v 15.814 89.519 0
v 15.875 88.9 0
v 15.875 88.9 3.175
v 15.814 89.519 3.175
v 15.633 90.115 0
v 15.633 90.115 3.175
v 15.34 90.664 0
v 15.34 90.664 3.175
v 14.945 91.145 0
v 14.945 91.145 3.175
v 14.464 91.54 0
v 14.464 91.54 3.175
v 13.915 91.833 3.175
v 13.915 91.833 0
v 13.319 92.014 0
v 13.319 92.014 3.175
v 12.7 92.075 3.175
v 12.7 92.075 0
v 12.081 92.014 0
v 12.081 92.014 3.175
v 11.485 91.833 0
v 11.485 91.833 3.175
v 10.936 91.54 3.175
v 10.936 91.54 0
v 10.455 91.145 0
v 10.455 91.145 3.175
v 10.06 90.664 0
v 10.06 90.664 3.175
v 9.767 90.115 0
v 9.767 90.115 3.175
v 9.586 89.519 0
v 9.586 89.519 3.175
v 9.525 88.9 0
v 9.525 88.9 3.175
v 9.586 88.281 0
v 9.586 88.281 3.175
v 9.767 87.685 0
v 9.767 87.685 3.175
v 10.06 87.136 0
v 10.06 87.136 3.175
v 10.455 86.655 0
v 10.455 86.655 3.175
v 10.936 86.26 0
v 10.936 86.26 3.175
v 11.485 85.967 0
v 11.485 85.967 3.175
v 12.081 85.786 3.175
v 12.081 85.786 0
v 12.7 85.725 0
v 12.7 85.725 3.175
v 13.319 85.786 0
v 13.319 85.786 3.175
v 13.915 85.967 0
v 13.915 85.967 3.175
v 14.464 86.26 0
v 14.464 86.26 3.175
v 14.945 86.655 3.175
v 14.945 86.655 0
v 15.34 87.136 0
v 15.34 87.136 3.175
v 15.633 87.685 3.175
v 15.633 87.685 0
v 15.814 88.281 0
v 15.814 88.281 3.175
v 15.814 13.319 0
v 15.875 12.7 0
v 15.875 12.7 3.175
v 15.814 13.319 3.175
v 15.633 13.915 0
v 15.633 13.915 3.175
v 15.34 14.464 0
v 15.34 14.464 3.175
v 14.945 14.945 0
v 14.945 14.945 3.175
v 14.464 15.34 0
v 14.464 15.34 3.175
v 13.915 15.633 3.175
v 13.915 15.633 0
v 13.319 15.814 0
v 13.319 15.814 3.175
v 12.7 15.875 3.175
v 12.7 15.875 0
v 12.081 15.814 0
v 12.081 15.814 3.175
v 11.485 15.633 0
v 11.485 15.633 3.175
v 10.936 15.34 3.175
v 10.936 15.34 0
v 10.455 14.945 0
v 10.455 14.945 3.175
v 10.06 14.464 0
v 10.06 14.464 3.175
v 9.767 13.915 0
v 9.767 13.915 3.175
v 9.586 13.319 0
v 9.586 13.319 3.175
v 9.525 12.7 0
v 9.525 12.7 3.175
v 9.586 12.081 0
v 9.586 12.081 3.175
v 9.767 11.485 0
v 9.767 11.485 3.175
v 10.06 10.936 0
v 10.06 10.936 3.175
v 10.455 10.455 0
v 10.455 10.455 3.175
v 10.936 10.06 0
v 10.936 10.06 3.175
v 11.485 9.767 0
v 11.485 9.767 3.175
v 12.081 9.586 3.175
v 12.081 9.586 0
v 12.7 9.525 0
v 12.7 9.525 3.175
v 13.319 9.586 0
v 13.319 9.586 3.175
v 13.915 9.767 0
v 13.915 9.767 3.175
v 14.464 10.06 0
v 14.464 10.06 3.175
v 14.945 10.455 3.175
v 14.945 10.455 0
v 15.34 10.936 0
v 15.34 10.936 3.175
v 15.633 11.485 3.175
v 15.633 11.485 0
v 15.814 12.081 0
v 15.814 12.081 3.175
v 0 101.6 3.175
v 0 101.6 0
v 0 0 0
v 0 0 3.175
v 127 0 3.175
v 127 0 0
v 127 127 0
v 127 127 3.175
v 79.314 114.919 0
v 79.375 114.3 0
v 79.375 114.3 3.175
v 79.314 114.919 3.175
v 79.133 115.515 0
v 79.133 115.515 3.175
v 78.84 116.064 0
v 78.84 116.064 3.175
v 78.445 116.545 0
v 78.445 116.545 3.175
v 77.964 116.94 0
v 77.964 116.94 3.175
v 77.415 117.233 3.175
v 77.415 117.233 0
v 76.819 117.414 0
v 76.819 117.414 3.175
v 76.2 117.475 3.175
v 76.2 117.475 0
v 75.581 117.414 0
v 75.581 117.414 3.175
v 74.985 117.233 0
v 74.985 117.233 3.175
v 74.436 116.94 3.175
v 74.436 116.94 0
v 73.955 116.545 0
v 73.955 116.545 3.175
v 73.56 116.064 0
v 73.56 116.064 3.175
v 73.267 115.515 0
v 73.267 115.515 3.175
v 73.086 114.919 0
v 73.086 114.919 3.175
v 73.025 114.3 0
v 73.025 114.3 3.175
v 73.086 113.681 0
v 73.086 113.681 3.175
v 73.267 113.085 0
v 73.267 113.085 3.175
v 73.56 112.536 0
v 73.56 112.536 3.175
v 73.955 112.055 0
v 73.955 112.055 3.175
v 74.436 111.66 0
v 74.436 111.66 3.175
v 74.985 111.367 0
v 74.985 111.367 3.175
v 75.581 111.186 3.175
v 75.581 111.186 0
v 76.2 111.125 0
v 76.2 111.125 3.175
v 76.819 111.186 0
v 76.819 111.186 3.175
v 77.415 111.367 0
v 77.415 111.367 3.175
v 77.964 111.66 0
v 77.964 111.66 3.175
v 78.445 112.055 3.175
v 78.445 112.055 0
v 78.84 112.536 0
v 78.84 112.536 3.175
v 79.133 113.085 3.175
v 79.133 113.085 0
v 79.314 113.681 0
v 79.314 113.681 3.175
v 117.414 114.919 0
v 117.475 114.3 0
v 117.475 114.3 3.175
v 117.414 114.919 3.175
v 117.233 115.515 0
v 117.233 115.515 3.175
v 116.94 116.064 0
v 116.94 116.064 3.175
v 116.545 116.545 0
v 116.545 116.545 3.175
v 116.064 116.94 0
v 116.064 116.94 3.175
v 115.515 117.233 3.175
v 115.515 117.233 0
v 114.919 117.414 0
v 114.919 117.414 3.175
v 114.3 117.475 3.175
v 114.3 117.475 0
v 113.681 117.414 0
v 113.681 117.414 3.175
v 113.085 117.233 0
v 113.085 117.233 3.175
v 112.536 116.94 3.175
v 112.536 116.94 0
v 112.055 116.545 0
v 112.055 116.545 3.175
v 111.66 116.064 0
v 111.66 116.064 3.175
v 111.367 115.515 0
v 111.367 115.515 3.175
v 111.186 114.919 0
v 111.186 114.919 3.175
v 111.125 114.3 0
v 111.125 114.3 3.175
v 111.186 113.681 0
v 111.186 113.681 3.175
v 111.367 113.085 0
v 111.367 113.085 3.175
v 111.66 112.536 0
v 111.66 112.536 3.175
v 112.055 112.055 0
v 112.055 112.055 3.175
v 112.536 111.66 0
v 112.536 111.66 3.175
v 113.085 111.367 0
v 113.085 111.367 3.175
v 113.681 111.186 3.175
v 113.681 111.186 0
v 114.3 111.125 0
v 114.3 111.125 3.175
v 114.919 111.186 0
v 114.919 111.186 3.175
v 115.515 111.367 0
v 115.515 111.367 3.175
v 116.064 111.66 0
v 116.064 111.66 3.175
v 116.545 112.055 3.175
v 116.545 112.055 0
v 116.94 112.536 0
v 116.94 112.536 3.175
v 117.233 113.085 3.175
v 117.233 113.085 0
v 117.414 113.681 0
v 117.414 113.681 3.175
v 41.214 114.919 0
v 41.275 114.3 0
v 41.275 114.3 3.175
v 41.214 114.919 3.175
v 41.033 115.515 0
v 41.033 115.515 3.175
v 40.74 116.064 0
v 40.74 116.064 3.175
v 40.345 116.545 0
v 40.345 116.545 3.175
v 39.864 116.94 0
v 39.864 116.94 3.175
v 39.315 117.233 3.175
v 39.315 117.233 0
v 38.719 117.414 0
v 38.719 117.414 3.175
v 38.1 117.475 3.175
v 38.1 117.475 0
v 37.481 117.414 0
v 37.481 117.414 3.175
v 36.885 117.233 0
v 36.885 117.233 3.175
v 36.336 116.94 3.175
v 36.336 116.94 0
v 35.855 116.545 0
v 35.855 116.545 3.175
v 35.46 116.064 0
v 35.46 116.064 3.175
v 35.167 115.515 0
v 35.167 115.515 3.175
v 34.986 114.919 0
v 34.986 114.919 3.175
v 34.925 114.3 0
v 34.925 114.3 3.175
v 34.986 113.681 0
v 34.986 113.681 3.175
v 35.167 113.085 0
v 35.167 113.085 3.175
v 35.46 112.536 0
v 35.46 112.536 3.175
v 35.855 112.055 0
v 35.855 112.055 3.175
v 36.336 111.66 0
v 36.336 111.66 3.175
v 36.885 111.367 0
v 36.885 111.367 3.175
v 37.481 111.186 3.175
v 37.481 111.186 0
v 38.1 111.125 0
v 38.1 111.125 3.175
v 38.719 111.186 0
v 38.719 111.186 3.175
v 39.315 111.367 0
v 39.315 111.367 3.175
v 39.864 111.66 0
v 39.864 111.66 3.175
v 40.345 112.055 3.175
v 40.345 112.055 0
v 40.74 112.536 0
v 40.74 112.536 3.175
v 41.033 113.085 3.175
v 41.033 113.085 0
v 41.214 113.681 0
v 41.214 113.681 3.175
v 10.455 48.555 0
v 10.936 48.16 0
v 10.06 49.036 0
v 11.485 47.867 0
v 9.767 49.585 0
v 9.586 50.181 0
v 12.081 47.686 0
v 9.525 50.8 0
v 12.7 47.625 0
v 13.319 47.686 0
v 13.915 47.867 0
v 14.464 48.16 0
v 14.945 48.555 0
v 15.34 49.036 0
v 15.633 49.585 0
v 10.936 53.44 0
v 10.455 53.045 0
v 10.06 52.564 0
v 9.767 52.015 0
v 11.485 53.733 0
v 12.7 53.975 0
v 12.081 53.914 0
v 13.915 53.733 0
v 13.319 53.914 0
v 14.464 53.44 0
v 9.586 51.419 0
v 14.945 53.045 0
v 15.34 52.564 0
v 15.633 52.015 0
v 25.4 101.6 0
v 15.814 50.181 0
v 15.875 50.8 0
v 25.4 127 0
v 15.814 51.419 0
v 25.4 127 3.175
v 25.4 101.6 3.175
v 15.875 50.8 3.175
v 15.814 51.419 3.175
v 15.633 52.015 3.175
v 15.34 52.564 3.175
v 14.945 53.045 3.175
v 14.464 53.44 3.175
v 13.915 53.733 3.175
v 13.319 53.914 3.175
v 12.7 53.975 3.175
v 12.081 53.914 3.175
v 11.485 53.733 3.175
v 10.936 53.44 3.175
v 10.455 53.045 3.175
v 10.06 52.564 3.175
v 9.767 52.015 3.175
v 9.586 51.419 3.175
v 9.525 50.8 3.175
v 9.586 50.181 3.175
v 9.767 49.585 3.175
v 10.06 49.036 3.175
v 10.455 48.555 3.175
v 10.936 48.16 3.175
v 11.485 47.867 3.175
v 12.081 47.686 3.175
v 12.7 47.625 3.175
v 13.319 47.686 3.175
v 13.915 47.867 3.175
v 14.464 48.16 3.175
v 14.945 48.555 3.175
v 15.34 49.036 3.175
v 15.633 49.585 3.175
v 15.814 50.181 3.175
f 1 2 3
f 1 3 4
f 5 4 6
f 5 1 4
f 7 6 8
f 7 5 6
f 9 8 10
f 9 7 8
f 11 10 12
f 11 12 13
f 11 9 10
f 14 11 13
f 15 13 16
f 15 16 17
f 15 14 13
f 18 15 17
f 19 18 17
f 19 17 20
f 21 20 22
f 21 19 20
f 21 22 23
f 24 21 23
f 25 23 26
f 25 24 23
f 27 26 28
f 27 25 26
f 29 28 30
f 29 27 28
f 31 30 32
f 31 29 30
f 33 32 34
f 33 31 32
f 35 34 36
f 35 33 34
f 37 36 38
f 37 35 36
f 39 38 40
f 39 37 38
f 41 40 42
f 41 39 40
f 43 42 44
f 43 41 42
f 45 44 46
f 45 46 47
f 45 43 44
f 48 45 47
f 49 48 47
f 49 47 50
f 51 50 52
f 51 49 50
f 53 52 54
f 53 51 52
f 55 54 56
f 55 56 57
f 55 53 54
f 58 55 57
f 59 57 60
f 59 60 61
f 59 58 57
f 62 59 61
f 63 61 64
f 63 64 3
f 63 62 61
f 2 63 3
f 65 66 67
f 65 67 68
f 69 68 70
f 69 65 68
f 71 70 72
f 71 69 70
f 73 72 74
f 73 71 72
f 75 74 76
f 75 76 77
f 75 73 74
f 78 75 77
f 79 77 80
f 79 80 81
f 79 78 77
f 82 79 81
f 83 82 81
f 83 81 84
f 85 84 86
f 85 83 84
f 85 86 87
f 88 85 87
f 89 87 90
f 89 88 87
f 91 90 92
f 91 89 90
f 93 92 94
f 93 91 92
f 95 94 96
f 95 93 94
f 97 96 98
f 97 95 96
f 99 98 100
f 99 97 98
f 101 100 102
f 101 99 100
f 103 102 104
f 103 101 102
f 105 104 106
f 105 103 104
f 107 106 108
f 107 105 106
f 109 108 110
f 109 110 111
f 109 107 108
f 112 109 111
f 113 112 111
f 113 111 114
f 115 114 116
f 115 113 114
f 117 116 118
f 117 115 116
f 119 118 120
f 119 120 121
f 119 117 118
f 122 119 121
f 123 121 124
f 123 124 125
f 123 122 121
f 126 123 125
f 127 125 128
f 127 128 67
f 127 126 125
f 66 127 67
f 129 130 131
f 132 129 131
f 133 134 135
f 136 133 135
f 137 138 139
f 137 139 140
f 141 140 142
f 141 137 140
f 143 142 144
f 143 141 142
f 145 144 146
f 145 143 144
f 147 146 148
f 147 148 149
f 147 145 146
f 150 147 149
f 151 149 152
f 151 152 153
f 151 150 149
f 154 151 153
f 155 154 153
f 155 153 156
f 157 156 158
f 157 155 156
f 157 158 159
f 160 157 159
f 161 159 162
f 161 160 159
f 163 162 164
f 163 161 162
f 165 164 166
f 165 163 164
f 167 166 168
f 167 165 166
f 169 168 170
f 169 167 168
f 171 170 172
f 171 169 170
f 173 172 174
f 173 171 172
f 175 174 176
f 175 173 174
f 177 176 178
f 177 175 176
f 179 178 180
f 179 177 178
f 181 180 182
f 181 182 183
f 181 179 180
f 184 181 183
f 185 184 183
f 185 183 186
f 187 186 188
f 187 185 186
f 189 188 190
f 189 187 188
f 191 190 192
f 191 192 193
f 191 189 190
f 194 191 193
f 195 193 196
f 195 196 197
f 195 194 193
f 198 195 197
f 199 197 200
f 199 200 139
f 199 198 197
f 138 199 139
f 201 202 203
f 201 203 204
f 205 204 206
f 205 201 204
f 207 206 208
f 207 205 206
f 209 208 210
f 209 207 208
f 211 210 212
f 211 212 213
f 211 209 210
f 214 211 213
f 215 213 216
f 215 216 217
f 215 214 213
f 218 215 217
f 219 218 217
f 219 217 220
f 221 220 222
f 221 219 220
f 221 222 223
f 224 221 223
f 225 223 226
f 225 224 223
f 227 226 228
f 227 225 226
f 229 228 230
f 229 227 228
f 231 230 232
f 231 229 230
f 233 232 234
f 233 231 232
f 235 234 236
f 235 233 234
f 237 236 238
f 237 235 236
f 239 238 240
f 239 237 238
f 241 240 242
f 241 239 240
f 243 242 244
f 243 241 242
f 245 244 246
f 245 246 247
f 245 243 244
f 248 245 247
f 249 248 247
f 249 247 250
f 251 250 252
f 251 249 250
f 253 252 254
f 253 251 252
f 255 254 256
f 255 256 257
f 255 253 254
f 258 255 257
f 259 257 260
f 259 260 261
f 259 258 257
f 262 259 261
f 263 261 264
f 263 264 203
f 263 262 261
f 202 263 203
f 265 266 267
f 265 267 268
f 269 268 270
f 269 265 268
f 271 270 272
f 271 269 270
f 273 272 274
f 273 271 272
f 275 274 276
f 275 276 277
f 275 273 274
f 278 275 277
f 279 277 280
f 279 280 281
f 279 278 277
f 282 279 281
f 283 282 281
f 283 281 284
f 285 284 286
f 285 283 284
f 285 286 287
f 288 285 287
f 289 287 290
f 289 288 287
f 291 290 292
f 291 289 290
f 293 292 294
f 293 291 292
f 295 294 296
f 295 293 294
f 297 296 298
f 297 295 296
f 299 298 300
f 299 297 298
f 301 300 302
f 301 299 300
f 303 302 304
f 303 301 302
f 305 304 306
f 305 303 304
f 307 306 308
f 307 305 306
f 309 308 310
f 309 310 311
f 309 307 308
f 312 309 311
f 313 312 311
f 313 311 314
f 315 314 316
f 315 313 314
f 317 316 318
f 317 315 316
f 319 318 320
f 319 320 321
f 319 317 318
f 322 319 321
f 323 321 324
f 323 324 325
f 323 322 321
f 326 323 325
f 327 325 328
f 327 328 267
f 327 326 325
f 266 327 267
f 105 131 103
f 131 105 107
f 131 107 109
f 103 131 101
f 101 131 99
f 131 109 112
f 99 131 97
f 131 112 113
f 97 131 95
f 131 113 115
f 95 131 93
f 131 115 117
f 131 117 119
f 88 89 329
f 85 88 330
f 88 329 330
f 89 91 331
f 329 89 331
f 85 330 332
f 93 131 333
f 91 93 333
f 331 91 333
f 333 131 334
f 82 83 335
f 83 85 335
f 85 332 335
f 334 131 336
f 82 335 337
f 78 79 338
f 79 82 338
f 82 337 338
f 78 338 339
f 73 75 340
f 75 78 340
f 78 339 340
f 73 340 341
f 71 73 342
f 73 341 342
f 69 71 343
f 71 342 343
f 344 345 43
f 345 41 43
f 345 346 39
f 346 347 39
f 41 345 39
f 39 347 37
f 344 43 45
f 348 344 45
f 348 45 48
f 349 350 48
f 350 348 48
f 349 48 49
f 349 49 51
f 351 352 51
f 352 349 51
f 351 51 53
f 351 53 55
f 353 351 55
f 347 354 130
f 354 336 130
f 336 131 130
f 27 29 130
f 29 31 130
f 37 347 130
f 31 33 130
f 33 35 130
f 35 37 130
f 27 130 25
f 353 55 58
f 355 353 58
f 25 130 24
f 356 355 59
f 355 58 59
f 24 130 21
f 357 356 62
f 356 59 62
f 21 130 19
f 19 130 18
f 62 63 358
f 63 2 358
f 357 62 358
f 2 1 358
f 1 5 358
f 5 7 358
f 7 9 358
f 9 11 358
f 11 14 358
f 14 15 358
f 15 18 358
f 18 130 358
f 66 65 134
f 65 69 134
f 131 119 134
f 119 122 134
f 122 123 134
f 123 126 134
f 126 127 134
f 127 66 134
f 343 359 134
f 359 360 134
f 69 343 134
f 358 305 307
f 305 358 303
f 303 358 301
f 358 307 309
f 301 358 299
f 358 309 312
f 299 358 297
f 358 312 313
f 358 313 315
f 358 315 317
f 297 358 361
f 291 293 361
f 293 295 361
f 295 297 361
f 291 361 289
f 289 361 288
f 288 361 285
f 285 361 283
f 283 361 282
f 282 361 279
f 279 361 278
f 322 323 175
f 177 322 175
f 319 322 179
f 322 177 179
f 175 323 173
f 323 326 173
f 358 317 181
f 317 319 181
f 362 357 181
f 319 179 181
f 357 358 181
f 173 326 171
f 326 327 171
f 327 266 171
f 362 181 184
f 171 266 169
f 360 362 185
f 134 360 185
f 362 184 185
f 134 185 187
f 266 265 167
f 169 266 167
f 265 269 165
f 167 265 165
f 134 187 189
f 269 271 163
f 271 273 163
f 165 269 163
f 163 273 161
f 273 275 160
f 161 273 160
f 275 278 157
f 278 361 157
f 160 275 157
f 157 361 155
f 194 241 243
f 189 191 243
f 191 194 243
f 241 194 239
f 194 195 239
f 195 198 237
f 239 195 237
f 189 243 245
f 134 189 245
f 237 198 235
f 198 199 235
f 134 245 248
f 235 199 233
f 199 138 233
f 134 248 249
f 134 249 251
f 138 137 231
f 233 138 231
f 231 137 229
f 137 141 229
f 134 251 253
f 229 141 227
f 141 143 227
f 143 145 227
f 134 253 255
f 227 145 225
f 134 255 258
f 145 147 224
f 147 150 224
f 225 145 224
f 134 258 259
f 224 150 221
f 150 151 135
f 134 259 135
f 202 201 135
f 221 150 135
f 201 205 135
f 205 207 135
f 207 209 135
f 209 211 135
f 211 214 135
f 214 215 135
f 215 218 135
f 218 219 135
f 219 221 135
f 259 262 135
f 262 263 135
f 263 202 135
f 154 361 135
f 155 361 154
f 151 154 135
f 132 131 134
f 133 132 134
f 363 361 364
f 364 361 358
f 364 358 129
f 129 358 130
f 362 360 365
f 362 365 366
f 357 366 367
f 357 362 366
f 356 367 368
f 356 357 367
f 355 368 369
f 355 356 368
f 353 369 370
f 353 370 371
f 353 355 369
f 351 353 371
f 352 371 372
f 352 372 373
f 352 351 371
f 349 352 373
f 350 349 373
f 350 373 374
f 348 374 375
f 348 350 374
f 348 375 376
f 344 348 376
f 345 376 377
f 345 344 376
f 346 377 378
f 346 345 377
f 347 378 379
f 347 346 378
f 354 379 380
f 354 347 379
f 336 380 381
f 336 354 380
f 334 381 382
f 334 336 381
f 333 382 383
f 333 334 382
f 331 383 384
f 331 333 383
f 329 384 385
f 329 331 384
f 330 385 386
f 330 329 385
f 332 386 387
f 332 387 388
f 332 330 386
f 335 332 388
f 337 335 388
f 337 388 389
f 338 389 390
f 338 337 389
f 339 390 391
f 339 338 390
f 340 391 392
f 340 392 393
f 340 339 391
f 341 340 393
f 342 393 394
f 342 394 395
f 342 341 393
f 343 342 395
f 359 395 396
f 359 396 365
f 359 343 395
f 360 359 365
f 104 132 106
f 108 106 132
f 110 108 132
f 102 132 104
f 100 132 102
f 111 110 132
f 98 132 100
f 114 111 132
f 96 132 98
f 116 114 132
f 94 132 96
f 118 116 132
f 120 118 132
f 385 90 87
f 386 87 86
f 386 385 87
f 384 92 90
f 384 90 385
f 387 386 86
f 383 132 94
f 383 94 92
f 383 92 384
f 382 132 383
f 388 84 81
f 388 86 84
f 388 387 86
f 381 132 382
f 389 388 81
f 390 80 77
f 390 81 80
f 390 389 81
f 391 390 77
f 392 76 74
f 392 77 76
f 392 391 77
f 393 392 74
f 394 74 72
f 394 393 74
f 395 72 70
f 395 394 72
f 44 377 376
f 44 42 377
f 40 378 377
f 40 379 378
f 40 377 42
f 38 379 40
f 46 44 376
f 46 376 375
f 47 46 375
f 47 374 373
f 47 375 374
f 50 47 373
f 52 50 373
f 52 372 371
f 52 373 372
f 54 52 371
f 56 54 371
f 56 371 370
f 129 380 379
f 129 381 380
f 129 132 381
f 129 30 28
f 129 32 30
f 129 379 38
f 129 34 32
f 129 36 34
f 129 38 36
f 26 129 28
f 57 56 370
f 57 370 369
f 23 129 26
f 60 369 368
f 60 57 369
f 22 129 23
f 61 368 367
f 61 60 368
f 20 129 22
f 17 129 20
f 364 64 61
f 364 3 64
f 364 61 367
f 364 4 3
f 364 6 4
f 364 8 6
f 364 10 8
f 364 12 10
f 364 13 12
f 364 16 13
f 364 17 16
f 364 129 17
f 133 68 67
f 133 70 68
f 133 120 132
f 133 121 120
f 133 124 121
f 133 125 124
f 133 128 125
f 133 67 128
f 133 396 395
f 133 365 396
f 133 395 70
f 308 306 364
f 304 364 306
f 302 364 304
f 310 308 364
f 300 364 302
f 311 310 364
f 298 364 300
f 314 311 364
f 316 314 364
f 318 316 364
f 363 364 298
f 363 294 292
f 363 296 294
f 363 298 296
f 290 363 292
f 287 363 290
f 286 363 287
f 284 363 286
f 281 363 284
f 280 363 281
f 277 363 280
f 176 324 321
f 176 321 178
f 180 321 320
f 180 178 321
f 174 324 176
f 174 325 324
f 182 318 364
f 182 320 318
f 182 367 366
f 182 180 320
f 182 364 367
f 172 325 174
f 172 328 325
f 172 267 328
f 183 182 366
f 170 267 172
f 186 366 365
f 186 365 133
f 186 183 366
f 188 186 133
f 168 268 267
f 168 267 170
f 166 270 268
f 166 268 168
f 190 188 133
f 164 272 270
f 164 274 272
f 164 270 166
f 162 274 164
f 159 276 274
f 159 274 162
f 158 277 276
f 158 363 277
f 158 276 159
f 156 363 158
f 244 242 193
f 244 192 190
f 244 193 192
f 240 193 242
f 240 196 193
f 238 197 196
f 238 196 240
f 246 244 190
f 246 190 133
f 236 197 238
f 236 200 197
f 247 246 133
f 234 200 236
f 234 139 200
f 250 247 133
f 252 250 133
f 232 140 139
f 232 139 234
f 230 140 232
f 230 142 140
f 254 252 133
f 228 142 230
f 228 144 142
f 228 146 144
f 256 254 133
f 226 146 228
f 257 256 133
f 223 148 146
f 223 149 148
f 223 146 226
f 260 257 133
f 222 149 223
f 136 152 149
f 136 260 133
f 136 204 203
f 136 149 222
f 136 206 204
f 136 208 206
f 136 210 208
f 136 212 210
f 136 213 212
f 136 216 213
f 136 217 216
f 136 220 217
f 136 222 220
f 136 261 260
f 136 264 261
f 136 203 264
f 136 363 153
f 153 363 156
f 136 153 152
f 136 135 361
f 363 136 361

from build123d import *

# Parameters (mm, degrees)
SKETCH1_R           = 3.175
BOSS_EXTRUDE1_DEPTH = 3.175


with BuildPart() as part:
    # Sketch1 → Boss-Extrude1 (new body)
    with BuildSketch(Plane.XY):
        Polygon((0, 0), (127, 0), (127, 127), (25.4, 127), (25.4, 101.6), (0, 101.6), align=None)
        with Locations((12.7, 88.9)):
            Circle(SKETCH1_R, mode=Mode.SUBTRACT)
        with Locations((12.7, 50.8)):
            Circle(SKETCH1_R, mode=Mode.SUBTRACT)
        with Locations((12.7, 12.7)):
            Circle(SKETCH1_R, mode=Mode.SUBTRACT)
        with Locations((38.1, 114.3)):
            Circle(SKETCH1_R, mode=Mode.SUBTRACT)
        with Locations((76.2, 114.3)):
            Circle(SKETCH1_R, mode=Mode.SUBTRACT)
        with Locations((114.3, 114.3)):
            Circle(SKETCH1_R, mode=Mode.SUBTRACT)
    extrude(amount=BOSS_EXTRUDE1_DEPTH)


solid = part.part
